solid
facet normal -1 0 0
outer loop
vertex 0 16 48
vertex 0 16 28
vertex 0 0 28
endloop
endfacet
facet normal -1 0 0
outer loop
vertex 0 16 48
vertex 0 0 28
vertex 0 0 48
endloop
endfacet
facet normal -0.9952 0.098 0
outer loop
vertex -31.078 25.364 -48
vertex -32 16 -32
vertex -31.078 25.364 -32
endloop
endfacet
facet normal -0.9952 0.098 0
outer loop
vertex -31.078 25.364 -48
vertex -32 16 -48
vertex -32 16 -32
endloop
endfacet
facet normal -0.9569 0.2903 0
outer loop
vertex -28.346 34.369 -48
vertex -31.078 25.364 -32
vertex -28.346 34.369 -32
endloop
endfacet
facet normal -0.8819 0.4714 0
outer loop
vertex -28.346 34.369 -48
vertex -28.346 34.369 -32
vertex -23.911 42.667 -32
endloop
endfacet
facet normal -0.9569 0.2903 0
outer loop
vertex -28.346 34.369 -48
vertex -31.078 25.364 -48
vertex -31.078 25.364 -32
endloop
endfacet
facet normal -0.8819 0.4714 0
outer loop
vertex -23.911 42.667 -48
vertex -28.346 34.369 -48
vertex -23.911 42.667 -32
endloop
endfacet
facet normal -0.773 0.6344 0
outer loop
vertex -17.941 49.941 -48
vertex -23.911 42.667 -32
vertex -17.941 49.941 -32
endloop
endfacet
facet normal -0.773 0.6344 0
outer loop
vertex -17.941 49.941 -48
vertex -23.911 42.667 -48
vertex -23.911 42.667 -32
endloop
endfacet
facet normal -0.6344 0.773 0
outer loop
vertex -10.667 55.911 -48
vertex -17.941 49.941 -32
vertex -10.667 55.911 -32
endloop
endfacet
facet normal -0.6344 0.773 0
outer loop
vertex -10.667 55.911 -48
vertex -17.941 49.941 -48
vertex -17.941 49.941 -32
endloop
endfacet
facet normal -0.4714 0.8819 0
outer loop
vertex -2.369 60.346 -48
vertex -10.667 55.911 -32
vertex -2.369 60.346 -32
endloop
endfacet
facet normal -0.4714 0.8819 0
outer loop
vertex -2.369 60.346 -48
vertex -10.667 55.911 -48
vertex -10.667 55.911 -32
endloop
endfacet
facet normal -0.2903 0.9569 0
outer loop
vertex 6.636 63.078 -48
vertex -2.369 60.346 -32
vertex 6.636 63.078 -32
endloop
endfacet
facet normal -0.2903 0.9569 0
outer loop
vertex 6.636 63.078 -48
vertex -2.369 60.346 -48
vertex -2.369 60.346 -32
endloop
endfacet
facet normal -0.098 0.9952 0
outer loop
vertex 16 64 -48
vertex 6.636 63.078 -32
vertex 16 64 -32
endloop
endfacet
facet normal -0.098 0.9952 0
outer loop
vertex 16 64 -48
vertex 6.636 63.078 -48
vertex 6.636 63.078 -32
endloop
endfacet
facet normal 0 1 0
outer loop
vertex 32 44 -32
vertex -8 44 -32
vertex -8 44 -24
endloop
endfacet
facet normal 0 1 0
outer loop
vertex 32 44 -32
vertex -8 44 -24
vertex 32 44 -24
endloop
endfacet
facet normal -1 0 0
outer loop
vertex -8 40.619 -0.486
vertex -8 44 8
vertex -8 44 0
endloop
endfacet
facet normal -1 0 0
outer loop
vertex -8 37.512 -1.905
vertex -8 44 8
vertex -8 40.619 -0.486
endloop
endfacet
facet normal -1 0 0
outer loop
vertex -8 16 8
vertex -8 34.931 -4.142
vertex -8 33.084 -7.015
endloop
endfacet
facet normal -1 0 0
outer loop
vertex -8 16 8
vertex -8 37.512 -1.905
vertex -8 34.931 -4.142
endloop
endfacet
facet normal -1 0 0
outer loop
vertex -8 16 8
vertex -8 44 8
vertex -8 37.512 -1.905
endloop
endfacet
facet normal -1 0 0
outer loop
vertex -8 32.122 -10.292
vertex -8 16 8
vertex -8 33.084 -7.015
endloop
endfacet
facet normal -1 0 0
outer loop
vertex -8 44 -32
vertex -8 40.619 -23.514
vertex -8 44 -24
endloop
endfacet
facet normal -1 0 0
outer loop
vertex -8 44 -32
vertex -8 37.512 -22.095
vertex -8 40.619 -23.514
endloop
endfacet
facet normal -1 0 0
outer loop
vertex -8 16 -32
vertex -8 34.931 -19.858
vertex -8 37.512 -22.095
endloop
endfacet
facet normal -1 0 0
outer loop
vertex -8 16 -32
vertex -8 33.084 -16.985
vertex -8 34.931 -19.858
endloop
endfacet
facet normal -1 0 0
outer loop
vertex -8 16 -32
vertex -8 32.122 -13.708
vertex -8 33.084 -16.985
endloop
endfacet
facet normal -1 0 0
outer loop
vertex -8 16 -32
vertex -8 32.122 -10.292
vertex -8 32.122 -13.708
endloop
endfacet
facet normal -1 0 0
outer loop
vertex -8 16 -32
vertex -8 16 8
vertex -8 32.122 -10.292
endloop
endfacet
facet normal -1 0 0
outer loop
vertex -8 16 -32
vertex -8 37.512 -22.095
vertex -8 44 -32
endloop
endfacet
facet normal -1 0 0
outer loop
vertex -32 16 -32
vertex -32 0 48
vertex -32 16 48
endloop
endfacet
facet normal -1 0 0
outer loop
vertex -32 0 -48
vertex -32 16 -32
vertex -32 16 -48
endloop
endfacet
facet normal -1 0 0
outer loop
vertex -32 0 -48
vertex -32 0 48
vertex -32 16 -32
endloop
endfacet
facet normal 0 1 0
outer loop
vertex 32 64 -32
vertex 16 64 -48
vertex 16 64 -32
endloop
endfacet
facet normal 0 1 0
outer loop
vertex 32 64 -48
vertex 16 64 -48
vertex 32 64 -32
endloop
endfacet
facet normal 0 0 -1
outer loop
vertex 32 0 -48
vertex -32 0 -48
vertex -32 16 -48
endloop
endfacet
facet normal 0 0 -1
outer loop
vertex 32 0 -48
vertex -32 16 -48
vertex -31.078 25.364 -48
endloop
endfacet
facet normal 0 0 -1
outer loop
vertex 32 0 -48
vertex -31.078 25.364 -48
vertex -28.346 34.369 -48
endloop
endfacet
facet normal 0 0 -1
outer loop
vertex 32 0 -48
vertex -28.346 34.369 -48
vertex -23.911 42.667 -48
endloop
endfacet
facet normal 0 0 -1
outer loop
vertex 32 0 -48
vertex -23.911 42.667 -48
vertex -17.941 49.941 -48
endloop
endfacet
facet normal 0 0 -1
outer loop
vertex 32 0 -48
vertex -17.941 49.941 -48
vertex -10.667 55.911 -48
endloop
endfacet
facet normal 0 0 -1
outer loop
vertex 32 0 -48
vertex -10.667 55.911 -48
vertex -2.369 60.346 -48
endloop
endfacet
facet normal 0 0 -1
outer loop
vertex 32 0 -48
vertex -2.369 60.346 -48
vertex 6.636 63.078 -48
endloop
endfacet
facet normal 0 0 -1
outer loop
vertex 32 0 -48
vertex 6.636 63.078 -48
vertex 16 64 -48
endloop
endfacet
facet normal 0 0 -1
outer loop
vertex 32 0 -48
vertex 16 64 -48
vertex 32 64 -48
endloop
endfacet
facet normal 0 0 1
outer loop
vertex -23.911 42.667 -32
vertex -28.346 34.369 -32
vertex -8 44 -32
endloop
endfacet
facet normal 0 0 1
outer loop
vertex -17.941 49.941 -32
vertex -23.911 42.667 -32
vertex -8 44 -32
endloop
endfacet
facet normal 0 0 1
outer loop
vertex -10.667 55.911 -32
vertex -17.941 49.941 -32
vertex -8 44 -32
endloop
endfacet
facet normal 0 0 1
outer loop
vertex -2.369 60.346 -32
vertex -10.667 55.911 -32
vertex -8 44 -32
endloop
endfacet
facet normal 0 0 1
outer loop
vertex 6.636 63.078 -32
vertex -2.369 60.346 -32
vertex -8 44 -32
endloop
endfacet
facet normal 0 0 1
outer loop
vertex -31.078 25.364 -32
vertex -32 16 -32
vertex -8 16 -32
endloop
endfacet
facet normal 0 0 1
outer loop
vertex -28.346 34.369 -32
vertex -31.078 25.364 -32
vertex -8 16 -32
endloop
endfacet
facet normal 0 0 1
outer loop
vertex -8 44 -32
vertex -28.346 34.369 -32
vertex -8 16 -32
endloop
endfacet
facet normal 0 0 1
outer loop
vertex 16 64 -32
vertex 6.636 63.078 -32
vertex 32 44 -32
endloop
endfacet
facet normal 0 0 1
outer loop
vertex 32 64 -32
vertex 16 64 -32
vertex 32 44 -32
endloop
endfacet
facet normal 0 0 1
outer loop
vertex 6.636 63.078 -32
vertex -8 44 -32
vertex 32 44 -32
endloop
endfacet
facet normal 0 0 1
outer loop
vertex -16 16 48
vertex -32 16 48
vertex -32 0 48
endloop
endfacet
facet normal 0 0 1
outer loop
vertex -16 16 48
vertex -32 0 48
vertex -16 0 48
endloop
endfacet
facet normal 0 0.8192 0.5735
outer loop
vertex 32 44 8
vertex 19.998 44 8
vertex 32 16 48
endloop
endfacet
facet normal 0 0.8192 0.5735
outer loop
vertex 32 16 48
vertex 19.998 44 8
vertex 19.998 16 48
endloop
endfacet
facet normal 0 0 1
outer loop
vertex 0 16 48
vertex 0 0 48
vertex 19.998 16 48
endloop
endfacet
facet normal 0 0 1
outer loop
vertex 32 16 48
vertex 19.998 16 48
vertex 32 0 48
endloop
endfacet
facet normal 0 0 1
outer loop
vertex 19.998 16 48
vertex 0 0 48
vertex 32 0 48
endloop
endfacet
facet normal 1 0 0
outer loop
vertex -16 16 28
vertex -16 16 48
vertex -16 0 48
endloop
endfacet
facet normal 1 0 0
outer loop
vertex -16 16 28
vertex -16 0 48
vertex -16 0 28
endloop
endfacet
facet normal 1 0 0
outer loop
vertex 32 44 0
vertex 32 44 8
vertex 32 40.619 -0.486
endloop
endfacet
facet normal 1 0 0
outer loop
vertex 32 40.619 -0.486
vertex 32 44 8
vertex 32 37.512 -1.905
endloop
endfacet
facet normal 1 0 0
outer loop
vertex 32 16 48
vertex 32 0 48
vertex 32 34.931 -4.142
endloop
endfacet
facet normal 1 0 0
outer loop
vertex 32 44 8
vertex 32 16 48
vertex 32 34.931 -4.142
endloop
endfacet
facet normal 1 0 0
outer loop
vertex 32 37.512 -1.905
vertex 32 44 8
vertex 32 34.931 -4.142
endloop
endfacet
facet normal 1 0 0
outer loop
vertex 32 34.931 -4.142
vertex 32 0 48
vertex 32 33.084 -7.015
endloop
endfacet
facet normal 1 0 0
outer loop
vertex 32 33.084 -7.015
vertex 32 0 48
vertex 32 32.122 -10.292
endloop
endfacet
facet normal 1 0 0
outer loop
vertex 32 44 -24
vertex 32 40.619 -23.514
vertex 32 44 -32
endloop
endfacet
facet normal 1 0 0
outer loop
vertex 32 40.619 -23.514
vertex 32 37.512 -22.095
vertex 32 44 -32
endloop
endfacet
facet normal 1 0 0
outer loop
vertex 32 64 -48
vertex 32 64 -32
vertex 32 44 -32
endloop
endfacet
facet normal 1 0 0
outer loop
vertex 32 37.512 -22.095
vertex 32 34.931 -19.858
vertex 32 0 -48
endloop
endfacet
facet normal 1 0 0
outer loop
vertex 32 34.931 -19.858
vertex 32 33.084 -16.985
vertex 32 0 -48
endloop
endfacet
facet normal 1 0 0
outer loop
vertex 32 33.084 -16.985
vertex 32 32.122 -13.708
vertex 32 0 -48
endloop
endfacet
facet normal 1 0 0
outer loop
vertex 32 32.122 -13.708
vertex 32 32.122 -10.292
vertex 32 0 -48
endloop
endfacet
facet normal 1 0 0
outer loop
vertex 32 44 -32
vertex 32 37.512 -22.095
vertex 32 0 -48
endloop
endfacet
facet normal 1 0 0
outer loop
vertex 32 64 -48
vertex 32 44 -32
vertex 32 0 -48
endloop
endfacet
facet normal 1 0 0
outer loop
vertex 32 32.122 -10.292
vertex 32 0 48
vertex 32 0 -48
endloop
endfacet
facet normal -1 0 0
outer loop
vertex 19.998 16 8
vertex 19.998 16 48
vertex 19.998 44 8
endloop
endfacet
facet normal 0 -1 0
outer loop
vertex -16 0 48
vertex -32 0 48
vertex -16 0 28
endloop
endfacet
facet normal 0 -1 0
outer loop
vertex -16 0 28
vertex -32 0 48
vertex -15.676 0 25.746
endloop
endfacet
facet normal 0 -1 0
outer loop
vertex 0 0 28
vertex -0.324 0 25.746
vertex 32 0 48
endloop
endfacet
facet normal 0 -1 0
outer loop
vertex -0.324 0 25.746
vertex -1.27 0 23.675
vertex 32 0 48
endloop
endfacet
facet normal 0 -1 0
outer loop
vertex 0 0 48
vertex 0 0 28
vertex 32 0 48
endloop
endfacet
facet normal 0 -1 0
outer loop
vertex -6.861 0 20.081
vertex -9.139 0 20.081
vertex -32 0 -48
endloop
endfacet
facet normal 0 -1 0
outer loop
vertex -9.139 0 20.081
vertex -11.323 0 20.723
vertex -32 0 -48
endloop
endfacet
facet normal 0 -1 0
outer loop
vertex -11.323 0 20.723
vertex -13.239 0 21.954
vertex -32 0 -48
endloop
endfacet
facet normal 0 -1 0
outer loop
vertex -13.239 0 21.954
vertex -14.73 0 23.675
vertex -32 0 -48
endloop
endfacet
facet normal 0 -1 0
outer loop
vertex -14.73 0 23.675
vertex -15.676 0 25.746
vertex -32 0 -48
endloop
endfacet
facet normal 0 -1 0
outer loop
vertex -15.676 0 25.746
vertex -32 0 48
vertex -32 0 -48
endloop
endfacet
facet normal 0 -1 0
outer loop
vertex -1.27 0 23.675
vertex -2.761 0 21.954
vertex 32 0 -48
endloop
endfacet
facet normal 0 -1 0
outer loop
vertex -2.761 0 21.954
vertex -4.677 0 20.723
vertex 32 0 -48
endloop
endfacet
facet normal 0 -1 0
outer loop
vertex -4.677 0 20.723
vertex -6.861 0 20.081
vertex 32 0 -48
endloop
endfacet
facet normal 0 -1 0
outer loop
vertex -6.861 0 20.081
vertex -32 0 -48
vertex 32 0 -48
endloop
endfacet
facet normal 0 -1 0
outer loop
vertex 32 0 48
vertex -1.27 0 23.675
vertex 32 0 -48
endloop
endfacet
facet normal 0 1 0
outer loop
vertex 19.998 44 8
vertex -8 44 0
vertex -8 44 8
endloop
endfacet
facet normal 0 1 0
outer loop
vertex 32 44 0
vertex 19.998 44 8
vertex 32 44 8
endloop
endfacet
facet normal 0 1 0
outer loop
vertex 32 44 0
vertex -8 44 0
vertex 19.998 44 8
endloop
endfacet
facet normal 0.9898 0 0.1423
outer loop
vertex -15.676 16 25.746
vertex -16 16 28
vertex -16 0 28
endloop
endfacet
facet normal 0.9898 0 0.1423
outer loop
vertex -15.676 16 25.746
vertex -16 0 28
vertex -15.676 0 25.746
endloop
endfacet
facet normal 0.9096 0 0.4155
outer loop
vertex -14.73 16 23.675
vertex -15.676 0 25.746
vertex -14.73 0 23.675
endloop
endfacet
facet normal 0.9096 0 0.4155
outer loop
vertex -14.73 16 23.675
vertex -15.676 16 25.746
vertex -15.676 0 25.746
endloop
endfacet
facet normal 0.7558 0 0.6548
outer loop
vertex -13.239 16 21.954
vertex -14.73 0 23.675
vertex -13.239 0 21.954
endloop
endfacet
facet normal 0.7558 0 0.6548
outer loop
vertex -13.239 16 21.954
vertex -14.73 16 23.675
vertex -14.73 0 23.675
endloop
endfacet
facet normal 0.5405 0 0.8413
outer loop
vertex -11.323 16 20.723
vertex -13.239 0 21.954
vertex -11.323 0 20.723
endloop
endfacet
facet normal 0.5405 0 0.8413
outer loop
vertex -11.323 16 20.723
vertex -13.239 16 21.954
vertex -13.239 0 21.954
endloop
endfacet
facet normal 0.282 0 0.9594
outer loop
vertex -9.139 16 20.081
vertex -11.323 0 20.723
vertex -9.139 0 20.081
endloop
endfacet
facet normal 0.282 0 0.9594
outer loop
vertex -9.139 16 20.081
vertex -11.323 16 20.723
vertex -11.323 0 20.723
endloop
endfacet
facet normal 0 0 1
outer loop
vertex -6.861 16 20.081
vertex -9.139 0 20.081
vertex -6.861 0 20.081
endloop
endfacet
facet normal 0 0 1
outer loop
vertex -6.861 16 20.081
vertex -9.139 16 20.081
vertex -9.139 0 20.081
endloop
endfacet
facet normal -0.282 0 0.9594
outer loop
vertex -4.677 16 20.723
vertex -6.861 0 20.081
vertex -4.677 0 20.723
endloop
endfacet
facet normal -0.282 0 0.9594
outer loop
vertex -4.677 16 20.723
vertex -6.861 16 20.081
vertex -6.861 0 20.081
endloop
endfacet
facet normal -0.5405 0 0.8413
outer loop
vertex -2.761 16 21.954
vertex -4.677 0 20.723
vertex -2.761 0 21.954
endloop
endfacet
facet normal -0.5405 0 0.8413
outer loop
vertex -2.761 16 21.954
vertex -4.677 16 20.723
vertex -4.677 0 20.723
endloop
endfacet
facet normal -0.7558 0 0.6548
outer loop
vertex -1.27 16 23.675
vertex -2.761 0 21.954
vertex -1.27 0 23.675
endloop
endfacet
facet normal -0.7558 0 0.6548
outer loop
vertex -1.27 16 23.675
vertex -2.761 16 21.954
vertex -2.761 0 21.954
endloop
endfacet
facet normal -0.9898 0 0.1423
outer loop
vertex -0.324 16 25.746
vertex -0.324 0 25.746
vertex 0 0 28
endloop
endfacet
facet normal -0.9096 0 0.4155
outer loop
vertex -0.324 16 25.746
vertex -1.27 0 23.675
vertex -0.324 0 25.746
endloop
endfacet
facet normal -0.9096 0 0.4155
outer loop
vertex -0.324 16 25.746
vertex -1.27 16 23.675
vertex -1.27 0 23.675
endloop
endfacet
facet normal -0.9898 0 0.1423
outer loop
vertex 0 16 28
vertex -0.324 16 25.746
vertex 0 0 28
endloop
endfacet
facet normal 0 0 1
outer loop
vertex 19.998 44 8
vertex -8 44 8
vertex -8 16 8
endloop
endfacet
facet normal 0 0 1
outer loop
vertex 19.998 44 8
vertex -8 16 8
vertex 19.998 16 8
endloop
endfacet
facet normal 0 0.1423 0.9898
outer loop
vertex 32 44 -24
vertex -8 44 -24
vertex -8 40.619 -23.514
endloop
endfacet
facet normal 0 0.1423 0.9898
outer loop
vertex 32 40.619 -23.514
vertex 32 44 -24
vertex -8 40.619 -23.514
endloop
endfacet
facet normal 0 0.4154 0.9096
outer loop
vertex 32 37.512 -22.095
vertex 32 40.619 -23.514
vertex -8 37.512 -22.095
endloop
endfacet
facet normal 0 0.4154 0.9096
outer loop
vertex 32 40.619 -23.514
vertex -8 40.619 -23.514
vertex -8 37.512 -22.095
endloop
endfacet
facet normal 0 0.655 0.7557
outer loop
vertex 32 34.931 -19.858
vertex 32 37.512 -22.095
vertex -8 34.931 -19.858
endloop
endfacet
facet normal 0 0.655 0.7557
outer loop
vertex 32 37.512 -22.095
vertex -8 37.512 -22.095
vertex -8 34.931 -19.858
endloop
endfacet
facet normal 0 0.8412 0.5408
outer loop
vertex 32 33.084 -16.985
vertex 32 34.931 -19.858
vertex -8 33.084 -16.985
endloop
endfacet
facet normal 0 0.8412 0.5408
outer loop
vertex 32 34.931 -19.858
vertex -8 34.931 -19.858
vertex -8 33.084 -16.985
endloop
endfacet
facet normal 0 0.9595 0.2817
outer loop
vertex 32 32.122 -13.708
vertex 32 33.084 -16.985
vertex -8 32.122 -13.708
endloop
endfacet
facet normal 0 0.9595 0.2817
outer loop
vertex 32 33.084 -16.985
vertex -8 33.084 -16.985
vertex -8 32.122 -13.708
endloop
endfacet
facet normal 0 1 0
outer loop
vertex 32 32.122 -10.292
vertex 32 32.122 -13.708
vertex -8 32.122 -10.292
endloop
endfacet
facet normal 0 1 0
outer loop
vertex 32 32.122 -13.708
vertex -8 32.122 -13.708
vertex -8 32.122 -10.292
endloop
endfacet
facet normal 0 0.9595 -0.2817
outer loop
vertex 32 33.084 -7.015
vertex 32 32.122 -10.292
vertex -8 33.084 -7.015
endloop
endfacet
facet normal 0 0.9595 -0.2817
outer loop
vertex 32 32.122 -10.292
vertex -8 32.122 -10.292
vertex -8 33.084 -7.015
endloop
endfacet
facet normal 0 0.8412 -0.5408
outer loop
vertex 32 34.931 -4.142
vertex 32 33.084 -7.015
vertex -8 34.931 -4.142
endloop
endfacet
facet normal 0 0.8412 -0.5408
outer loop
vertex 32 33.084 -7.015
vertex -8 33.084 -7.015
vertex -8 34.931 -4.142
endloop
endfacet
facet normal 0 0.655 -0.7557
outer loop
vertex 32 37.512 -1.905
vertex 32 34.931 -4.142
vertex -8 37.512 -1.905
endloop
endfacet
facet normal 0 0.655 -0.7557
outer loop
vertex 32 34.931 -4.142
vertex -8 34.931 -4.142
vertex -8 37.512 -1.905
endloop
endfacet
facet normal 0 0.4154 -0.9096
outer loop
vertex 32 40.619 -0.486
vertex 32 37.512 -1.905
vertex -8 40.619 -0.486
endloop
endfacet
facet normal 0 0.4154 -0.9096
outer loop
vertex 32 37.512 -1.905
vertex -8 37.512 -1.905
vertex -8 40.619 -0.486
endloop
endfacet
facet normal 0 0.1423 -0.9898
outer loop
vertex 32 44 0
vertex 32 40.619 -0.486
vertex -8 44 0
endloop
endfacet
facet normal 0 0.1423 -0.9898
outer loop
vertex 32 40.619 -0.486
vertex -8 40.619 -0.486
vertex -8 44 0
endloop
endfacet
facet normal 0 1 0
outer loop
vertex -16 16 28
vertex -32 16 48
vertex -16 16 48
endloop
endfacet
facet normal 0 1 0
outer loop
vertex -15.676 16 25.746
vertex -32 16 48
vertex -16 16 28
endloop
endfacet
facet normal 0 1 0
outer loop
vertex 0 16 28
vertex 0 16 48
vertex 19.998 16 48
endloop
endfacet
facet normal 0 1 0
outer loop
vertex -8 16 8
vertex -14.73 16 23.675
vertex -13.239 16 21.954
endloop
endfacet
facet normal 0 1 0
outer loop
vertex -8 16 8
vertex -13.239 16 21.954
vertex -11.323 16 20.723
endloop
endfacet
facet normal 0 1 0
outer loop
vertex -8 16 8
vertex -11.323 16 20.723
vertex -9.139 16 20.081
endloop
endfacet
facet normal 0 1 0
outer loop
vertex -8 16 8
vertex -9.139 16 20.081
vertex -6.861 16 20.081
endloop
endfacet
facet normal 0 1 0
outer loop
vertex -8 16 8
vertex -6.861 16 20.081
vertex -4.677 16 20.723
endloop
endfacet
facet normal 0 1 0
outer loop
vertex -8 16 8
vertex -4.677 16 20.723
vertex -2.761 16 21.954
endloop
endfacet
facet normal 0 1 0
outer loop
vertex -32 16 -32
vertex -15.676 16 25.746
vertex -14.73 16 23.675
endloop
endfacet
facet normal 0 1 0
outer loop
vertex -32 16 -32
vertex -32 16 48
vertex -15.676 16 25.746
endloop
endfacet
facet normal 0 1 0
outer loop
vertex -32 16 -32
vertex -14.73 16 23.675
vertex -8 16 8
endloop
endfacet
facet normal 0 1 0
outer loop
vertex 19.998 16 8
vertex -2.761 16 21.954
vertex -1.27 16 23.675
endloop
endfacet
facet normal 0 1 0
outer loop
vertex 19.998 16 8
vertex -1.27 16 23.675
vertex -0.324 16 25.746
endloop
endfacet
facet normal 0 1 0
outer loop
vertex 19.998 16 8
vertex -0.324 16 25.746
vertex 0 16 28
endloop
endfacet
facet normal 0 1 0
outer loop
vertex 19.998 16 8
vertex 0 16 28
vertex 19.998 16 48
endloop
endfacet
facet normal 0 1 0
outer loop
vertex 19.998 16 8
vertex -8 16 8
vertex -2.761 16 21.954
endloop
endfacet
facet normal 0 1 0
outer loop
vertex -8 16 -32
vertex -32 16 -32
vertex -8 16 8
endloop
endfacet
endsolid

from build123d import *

# Parameters (mm, degrees)
SKETCH2_W           = 64
SKETCH2_H           = 96
BOSS_EXTRUDE1_DEPTH = 16
SKETCH3_W           = 64
SKETCH3_H           = 16
BOSS_EXTRUDE3_DEPTH = 48
FILLET3_R           = 48
SKETCH5_W           = 40
SKETCH5_H           = 40
BOSS_EXTRUDE4_DEPTH = 28
SKETCH6_R           = 12
CUT_EXTRUDE1_DEPTH  = 63
SKETCH7_W           = 12.002152701
SKETCH7_H           = 40
BOSS_EXTRUDE6_DEPTH = 28
CUT_EXTRUDE2_DEPTH  = 30
CUT_EXTRUDE3_DEPTH  = 17


with BuildPart() as part:
    # Sketch2 → Boss-Extrude1 (new body)
    with BuildSketch(Plane(origin=(0, 0, 0), x_dir=(1, 0, 0), z_dir=(0, 1, 0))):
        Rectangle(SKETCH2_W, SKETCH2_H)
    extrude(amount=BOSS_EXTRUDE1_DEPTH)

    # Sketch3 → Boss-Extrude3 (add)
    with BuildSketch(Plane(origin=(0, 16, 0), x_dir=(1, 0, 0), z_dir=(0, 1, 0))):
        with Locations((0, 40)):
            Rectangle(SKETCH3_W, SKETCH3_H)
    extrude(amount=BOSS_EXTRUDE3_DEPTH)

    # Fillet3
    fillet3_edges = [part.edges().sort_by_distance(p)[0] for p in [
        (-32, 64, -40),
    ]]
    fillet(fillet3_edges, radius=FILLET3_R)

    # Sketch5 → Boss-Extrude4 (add)
    with BuildSketch(Plane(origin=(0, 16, 0), x_dir=(1, 0, 0), z_dir=(0, 1, 0))):
        with Locations((12, 12)):
            Rectangle(SKETCH5_W, SKETCH5_H)
    extrude(amount=BOSS_EXTRUDE4_DEPTH)

    # Sketch6 → Cut-Extrude1 (cut)
    with BuildSketch(Plane.ZY.offset(8)):
        with Locations((-12, 44)):
            Circle(SKETCH6_R)
    extrude(amount=-CUT_EXTRUDE1_DEPTH, mode=Mode.SUBTRACT)

    # Sketch7 → Boss-Extrude6 (add)
    with BuildSketch(Plane(origin=(0, 16, 0), x_dir=(1, 0, 0), z_dir=(0, 1, 0))):
        with Locations((25.99892365, -28)):
            Rectangle(SKETCH7_W, SKETCH7_H)
    extrude(amount=BOSS_EXTRUDE6_DEPTH)

    # Sketch9 → Cut-Extrude2 (cut)
    with BuildSketch(Plane.ZY.offset(-19.997847299)):
        Polygon((8, 44), (48, 16), (48, 44), align=None)
    extrude(amount=-CUT_EXTRUDE2_DEPTH, mode=Mode.SUBTRACT)

    # Sketch10 → Cut-Extrude3 (cut, through all)
    with BuildSketch(Plane(origin=(0, 16, 0), x_dir=(1, 0, 0), z_dir=(0, 1, 0))):
        with BuildLine():
            Line((-16, -48), (-16, -28))
            ThreePointArc((-16, -28), (-8, -20), (0, -28))
            Line((0, -28), (0, -48))
            ThreePointArc((0, -48), (-8, -56), (-16, -48))
        make_face()
    extrude(amount=-CUT_EXTRUDE3_DEPTH, mode=Mode.SUBTRACT)


solid = part.part
